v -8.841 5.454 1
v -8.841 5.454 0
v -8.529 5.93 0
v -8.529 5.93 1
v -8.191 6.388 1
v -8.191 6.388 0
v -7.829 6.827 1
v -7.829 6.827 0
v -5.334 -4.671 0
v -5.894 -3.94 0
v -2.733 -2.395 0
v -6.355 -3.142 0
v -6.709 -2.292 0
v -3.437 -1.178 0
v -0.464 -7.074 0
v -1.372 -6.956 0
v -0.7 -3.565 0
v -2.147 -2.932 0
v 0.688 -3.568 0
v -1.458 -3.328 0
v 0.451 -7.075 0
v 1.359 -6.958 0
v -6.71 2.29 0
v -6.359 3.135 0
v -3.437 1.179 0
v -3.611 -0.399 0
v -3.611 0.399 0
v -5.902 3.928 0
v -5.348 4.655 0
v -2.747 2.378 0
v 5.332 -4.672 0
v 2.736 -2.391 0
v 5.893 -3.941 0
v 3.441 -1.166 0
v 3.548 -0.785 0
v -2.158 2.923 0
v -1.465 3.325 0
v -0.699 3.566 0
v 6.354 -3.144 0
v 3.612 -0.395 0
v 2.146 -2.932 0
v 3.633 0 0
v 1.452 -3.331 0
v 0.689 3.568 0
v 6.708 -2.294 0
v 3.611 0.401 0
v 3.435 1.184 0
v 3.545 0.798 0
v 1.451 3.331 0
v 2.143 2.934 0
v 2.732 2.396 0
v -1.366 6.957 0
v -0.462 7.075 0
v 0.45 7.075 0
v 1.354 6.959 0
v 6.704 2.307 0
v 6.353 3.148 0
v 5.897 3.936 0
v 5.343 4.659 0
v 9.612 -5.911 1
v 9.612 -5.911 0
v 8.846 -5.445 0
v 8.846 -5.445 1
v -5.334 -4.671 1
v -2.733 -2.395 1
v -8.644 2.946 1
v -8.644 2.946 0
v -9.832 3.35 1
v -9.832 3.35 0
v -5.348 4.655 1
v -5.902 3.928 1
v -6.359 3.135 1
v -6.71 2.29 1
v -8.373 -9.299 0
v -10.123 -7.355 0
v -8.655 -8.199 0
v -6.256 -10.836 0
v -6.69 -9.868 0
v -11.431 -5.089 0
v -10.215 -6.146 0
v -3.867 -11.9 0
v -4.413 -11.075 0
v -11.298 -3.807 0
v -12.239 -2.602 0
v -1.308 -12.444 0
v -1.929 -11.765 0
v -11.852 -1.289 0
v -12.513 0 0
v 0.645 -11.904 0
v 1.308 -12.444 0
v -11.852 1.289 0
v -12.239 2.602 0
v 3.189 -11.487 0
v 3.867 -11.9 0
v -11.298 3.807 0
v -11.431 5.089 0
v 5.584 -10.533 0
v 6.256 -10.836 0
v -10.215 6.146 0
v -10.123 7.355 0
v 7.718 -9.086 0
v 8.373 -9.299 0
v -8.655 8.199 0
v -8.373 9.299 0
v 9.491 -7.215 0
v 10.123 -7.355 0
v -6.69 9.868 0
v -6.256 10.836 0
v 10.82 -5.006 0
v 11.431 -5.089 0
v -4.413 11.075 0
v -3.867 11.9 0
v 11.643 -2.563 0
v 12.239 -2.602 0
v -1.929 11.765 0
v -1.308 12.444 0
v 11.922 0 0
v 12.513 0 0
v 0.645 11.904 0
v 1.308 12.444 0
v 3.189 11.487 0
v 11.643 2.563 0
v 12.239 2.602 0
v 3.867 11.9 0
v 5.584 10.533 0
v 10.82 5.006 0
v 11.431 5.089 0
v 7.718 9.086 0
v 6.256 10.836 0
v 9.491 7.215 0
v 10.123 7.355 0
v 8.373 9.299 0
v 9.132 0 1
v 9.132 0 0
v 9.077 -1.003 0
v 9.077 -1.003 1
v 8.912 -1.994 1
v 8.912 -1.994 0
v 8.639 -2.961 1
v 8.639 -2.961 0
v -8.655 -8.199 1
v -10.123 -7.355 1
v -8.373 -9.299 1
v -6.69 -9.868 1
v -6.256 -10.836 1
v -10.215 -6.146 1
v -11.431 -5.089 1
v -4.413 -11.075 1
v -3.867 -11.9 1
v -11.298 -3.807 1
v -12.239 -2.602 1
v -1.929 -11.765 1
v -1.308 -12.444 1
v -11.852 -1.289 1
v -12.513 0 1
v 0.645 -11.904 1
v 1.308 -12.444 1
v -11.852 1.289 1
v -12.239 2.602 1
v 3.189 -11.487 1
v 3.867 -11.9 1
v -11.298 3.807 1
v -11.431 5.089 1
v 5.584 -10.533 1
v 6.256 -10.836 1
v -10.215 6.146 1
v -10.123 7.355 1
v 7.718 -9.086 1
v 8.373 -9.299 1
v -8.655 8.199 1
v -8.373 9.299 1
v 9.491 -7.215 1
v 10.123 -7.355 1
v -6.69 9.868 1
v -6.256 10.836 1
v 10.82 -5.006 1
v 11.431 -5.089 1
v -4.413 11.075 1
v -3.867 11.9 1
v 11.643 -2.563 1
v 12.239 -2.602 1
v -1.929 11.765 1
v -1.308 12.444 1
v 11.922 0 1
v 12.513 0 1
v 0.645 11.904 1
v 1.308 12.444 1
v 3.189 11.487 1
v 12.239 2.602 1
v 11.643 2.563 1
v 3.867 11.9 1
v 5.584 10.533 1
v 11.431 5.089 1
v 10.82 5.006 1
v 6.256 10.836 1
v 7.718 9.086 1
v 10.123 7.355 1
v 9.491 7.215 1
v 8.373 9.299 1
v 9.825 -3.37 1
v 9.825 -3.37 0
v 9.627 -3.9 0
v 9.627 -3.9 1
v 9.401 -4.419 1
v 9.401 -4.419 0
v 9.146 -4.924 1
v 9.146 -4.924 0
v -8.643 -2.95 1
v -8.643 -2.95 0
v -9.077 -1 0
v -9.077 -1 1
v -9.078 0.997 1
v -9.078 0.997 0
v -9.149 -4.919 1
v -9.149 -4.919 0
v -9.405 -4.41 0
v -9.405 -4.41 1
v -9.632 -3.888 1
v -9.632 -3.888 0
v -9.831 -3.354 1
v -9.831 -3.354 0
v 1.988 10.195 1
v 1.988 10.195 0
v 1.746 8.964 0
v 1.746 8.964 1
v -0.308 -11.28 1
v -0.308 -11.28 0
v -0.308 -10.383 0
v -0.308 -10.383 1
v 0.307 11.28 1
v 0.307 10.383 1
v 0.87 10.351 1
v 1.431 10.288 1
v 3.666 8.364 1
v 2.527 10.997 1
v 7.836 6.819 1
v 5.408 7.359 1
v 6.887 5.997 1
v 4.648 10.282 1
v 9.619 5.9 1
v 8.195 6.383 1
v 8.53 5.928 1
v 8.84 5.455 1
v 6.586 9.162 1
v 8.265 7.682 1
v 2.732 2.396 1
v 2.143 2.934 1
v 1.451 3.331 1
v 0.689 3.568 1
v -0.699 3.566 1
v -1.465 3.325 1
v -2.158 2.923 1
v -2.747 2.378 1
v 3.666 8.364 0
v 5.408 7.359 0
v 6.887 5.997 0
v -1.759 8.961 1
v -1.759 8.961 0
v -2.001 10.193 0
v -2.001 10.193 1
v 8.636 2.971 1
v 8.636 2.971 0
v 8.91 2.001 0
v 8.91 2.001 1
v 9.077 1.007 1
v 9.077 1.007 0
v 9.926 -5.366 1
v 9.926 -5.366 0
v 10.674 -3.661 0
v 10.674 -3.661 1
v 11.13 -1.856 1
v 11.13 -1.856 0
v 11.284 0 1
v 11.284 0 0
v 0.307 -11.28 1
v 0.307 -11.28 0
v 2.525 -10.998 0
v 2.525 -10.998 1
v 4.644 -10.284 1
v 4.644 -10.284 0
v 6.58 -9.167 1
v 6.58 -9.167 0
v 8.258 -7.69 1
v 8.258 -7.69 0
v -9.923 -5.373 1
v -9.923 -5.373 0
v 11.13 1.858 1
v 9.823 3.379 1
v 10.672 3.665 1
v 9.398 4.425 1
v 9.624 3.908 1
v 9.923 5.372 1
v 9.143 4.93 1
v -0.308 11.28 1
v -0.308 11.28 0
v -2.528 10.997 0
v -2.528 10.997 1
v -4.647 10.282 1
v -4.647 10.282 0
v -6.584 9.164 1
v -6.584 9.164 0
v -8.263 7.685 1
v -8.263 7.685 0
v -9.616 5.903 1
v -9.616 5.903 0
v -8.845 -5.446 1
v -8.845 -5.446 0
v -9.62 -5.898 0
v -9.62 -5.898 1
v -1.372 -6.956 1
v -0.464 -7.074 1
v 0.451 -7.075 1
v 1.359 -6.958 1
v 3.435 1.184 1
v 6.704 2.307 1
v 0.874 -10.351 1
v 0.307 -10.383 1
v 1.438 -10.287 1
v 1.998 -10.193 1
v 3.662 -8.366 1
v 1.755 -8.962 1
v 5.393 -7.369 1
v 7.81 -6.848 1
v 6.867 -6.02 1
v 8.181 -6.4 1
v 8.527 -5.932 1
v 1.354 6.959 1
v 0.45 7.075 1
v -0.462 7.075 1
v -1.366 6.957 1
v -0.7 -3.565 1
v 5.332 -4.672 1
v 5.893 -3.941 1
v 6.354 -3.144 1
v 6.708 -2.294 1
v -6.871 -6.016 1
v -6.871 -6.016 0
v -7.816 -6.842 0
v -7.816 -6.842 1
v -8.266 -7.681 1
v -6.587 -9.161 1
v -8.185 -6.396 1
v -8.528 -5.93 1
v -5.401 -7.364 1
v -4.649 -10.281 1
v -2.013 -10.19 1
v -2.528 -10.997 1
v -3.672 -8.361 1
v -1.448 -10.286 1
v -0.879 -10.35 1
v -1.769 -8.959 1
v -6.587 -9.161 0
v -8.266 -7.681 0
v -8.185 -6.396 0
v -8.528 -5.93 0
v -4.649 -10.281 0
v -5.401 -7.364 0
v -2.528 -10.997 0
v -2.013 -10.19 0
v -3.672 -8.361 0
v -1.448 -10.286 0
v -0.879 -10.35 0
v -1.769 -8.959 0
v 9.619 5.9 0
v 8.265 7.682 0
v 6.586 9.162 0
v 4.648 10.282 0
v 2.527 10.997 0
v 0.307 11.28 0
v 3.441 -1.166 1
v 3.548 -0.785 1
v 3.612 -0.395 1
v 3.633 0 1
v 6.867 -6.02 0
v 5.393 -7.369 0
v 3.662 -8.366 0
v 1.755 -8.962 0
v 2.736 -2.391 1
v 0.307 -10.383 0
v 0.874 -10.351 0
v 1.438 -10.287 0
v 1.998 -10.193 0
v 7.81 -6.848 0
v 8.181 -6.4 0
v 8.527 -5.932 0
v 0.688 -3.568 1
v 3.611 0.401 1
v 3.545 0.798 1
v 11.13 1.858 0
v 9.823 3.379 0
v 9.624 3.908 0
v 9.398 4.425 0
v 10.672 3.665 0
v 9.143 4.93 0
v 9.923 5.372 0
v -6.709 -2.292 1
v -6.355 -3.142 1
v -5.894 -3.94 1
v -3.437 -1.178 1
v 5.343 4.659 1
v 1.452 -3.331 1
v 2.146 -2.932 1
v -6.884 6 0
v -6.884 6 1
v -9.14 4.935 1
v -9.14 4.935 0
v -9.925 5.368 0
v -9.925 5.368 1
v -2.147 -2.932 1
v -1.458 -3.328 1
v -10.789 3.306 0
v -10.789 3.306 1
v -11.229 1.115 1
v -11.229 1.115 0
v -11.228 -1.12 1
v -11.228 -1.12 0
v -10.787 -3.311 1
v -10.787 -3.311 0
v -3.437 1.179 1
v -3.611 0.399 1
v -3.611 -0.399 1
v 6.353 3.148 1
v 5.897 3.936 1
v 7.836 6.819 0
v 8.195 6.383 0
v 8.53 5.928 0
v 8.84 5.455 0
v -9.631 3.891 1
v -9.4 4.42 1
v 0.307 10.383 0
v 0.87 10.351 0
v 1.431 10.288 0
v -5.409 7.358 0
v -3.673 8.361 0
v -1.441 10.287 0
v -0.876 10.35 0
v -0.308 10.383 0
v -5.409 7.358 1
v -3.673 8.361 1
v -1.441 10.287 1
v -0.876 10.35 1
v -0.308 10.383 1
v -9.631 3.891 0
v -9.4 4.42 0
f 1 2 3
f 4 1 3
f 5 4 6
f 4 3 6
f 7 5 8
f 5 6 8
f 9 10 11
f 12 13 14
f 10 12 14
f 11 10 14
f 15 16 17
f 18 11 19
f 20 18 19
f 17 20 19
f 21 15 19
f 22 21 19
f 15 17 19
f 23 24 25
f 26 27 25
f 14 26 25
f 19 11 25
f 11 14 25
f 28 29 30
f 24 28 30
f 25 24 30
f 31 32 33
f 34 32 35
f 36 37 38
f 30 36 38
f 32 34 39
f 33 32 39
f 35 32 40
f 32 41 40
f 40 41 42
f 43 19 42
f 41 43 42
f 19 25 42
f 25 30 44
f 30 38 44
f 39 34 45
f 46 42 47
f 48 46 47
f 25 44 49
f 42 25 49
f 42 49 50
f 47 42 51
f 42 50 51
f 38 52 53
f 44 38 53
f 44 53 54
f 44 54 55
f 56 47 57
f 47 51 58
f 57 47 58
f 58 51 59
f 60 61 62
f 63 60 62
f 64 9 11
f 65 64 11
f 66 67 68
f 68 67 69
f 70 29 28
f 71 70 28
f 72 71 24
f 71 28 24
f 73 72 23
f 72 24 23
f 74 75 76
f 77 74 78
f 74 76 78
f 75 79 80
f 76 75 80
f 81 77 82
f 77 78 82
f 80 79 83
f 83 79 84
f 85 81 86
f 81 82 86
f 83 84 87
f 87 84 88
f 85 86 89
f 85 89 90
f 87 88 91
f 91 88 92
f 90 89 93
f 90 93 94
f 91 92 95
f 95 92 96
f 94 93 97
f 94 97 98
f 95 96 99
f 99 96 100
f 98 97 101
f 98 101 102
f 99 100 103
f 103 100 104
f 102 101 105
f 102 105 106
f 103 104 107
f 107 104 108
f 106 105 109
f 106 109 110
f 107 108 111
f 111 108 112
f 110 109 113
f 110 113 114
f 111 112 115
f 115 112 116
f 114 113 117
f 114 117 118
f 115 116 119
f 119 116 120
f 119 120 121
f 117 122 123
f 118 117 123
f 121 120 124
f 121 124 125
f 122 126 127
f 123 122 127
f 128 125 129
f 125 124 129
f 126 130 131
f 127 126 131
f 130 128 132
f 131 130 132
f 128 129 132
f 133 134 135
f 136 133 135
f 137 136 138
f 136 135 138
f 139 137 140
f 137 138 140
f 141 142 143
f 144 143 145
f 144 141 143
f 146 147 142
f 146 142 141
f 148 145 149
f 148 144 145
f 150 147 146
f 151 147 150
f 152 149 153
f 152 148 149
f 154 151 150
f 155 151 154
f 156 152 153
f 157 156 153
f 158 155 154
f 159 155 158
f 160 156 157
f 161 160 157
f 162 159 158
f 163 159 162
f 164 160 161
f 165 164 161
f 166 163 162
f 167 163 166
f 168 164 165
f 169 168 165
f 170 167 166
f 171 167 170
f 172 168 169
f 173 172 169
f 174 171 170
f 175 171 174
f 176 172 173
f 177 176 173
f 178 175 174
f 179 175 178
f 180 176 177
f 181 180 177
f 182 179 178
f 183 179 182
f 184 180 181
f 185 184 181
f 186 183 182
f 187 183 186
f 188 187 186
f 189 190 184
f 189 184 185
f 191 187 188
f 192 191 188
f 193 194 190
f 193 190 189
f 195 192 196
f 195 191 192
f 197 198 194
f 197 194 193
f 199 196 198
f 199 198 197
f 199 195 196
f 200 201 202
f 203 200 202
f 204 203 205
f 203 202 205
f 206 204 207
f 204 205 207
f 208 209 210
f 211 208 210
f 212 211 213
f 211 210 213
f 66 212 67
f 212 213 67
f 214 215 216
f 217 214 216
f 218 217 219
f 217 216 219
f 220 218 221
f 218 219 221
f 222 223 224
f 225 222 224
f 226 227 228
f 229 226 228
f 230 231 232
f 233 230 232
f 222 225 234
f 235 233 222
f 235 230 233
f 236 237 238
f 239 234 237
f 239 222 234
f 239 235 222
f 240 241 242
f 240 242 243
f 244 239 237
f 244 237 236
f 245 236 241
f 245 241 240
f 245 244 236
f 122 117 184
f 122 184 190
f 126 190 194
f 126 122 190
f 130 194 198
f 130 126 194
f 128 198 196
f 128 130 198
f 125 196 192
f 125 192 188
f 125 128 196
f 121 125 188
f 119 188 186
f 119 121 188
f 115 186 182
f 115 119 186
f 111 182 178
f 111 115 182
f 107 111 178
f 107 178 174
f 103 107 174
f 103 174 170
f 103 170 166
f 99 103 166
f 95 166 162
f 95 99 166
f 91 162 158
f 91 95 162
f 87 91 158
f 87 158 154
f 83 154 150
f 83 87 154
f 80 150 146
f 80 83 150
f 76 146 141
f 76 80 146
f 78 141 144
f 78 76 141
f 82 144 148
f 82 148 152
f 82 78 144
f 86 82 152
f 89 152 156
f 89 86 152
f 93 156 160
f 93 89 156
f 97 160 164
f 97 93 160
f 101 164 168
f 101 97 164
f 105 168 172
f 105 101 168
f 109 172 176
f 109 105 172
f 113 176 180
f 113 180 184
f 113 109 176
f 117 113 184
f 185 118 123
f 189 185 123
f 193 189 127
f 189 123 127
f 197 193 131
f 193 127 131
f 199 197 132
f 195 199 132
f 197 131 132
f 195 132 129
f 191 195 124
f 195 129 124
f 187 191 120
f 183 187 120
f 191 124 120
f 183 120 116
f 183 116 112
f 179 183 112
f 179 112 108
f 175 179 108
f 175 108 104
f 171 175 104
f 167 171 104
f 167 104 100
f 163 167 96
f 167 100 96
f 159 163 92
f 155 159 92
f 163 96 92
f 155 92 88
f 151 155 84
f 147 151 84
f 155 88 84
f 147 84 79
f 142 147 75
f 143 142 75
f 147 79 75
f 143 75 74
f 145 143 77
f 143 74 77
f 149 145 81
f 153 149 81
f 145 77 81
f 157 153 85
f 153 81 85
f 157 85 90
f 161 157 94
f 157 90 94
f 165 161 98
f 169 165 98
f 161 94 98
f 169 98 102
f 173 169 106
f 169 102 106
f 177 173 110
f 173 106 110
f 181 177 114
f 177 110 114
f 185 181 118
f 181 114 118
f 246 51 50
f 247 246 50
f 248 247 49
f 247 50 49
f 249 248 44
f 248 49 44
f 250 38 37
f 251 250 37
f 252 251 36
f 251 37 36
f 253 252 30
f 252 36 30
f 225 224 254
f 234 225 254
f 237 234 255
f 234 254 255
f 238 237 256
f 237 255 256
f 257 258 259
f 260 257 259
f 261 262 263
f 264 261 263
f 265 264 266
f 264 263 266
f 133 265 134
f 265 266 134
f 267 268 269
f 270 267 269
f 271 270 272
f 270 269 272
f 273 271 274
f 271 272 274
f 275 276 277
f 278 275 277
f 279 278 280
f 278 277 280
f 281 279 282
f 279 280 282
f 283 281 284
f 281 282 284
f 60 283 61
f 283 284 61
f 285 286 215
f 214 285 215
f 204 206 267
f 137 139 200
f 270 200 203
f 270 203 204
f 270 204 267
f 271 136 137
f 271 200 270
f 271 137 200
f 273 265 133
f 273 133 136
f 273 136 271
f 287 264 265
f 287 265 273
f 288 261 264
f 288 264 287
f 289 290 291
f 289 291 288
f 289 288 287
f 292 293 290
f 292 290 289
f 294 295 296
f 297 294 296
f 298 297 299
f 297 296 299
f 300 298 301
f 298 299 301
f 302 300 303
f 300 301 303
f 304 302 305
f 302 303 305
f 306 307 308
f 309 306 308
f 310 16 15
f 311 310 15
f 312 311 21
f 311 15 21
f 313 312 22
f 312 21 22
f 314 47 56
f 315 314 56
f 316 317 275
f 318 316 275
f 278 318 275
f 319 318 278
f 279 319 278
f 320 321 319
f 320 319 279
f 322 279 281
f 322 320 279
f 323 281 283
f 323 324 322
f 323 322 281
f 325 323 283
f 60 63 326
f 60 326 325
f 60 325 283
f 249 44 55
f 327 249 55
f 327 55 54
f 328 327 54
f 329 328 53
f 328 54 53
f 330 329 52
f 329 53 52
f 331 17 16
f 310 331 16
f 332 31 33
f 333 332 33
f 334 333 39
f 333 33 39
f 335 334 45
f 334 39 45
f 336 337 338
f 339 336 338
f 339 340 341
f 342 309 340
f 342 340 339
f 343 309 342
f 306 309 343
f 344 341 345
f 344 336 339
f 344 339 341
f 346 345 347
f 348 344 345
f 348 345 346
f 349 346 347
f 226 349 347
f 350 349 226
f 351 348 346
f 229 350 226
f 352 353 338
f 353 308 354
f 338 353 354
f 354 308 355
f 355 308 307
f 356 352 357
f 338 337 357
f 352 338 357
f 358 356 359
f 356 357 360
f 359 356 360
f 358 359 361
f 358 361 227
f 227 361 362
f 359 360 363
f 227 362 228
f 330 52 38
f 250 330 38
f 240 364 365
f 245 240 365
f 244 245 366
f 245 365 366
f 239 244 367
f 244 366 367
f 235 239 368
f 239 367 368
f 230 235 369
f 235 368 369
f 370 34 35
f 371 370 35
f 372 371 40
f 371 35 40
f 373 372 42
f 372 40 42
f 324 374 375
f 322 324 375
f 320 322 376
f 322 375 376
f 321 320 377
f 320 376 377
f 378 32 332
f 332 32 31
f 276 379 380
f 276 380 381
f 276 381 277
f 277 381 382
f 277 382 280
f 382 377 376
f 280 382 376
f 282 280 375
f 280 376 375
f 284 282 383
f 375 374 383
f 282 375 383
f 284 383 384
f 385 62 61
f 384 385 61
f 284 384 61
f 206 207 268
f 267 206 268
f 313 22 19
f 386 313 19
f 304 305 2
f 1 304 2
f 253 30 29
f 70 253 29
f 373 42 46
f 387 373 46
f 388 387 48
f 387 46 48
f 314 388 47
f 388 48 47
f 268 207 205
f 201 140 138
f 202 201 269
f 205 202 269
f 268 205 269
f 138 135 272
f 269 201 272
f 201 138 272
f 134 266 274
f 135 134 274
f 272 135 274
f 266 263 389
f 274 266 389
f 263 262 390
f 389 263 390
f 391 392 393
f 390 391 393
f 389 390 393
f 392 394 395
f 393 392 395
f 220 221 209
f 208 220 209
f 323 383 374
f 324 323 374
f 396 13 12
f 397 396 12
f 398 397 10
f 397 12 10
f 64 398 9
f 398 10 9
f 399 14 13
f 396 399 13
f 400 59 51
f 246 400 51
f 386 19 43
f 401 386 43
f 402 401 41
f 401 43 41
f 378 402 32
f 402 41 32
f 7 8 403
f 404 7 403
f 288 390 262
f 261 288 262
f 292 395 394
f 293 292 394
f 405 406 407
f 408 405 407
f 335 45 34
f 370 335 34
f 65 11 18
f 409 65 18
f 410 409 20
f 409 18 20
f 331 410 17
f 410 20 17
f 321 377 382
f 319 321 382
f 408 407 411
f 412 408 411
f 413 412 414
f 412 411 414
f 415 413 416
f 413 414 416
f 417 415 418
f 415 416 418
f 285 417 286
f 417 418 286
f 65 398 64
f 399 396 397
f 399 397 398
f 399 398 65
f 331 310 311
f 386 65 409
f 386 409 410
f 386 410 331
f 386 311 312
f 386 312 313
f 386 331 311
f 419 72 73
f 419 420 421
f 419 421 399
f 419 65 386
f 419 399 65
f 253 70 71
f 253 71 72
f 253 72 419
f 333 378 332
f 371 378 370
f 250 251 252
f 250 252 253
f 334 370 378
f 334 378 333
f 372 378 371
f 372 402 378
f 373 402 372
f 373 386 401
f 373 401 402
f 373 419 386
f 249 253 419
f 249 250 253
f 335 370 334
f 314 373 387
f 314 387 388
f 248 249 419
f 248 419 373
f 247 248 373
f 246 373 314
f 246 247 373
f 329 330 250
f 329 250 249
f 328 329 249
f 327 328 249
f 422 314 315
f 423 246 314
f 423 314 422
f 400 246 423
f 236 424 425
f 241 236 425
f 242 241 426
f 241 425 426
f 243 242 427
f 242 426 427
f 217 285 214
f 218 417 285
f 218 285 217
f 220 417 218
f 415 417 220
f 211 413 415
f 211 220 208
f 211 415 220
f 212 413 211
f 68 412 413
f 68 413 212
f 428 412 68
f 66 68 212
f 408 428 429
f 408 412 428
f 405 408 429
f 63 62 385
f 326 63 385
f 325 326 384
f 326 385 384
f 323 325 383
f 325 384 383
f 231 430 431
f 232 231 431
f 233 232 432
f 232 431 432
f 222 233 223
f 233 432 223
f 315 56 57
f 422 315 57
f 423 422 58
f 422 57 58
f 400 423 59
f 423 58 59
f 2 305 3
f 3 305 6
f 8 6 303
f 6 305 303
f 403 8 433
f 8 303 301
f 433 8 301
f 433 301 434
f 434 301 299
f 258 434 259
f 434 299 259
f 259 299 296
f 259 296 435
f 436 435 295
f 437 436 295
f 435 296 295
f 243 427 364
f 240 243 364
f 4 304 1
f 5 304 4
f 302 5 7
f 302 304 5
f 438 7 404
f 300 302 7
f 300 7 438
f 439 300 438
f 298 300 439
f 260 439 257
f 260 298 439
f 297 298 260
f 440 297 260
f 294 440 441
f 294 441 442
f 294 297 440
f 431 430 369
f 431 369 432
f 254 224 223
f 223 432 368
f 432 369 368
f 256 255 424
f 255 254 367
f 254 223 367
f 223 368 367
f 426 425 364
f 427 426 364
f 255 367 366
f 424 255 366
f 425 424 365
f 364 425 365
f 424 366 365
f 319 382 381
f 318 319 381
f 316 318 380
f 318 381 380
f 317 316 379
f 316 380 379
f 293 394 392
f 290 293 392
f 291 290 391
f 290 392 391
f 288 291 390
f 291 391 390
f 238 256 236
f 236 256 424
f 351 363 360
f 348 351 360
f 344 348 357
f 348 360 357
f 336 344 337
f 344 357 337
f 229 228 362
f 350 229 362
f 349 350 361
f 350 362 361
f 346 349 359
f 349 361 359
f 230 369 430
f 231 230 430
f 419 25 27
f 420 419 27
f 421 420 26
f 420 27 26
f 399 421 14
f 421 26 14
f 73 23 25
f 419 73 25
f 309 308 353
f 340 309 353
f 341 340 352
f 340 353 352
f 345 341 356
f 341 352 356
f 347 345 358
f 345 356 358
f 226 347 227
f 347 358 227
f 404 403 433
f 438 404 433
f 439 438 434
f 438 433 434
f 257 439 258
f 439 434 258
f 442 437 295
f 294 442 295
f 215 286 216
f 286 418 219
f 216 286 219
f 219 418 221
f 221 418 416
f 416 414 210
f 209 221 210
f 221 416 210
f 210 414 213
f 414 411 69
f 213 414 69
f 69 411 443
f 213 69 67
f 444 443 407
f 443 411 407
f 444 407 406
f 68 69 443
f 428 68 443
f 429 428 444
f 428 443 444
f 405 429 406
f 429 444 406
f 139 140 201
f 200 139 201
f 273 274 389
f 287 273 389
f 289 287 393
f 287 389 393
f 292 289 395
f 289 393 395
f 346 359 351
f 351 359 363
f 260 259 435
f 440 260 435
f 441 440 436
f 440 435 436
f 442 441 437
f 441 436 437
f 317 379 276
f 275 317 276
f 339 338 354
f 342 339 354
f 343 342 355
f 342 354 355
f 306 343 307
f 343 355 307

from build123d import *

# Parameters (mm, degrees)
F0_R     = 12.5129035434
F0_R_2   = 11.9218678141
F1_DEPTH = 1


with BuildPart() as f1:
    # F0 (on Top) → F1 (new body)
    with BuildSketch(Plane.XY):
        Circle(F0_R)
        Circle(F0_R_2, mode=Mode.SUBTRACT)
    extrude(amount=F1_DEPTH)


with BuildPart() as f1b:
    # F0 (on Top) → F1, piece 2 (new body)
    with BuildSketch(Plane.XY):
        with BuildLine():
            Line((8.8396388075, 5.4551908651), (9.6186460471, 5.8997504842))
            ThreePointArc((9.6186460471, 5.8997504842), (5.6447897831, 9.7704532065), (0.3066178794, 11.2796894031))
            Line((0.3066178794, 11.2796894031), (0.3066178794, 10.3828852974))
            ThreePointArc((0.3066178794, 10.3828852974), (1.1509963885, 10.3234455942), (1.9877316065, 10.1954521569))
            ThreePointArc((1.9877316065, 10.1954521569), (5.1936189617, 8.9958125649), (7.8355230443, 6.8193035014))
            ThreePointArc((7.8355230443, 6.8193035014), (8.3654322373, 6.1577483795), (8.8396388075, 5.4551908651))
        make_face()
        with BuildLine():
            Line((6.8870497225, 5.9972767185), (7.8355230443, 6.8193035014))
            ThreePointArc((7.8355230443, 6.8193035014), (5.1936189617, 8.9958125649), (1.9877316065, 10.1954521569))
            Line((1.9877316065, 10.1954521569), (1.7464057225, 8.9637519471))
            ThreePointArc((1.7464057225, 8.9637519471), (4.5644421401, 7.9097819102), (6.8870497225, 5.9972767185))
        make_face()
    extrude(amount=F1_DEPTH)


with BuildPart() as f1c:
    # F0 (on Top) → F1, piece 3 (new body)
    with BuildSketch(Plane.XY):
        with BuildLine():
            ThreePointArc((9.9261432267, -5.3662918481), (10.9391631066, -2.7676918331), (11.2838560588, 0))
            ThreePointArc((11.2838560588, 0), (10.9383436287, 2.7709287641), (9.9229655661, 5.3721654786))
            Line((9.9229655661, 5.3721654786), (9.1430323592, 4.9298357885))
            ThreePointArc((9.1430323592, 4.9298357885), (9.5144902121, 4.1680688127), (9.8226109206, 3.3785553607))
            ThreePointArc((9.8226109206, 3.3785553607), (10.2452385313, 1.7127197841), (10.3874116902, 0))
            ThreePointArc((10.3874116902, 0), (10.2459681219, -1.70834975), (9.8254894414, -3.3701749005))
            ThreePointArc((9.8254894414, -3.3701749005), (9.5176290977, -4.1608962954), (9.1462564846, -4.9238515351))
            Line((9.1462564846, -4.9238515351), (9.9261432267, -5.3662918481))
        make_face()
        with BuildLine():
            ThreePointArc((10.3874116902, 0), (10.2452385313, 1.7127197841), (9.8226109206, 3.3785553607))
            Line((9.8226109206, 3.3785553607), (8.6355698302, 2.9708106006))
            ThreePointArc((8.6355698302, 2.9708106006), (9.0072564883, 1.5060253886), (9.1322933548, 0))
            ThreePointArc((9.1322933548, 0), (9.0081483571, -1.5006815429), (8.6390886349, -2.9605623582))
            Line((8.6390886349, -2.9605623582), (9.8254894414, -3.3701749005))
            ThreePointArc((9.8254894414, -3.3701749005), (10.2459681219, -1.70834975), (10.3874116902, 0))
        make_face()
    extrude(amount=F1_DEPTH)


with BuildPart() as f1d:
    # F0 (on Top) → F1, piece 4 (new body)
    with BuildSketch(Plane.XY):
        with BuildLine():
            ThreePointArc((0.3073497054, -11.279669486), (5.6395470454, -9.7734802746), (9.6119265196, -5.9106916801))
            Line((9.6119265196, -5.9106916801), (8.8460164405, -5.4448429506))
            ThreePointArc((8.8460164405, -5.4448429506), (8.3575809895, -6.1684002486), (7.8101145103, -6.8483890776))
            ThreePointArc((7.8101145103, -6.8483890776), (5.1814766366, -9.0028118656), (1.9981252265, -10.1934202897))
            ThreePointArc((1.9981252265, -10.1934202897), (1.1566226105, -10.3228167551), (0.3073497054, -10.38286366))
            Line((0.3073497054, -10.38286366), (0.3073497054, -11.279669486))
        make_face()
        with BuildLine():
            ThreePointArc((1.9981252265, -10.1934202897), (5.1814766366, -9.0028118656), (7.8101145103, -6.8483890776))
            Line((7.8101145103, -6.8483890776), (6.867075268, -6.0201378042))
            ThreePointArc((6.867075268, -6.0201378042), (4.5549562659, -7.91524828), (1.7547104258, -8.9621299499))
            Line((1.7547104258, -8.9621299499), (1.9981252265, -10.1934202897))
        make_face()
    extrude(amount=F1_DEPTH)


with BuildPart() as f1e:
    # F0 (on Top) → F1, piece 5 (new body)
    with BuildSketch(Plane.XY):
        with BuildLine():
            ThreePointArc((-9.6198182765, -5.8978389164), (-5.6462804441, -9.7695918391), (-0.3078183345, -11.279656707))
            Line((-0.3078183345, -11.279656707), (-0.3078183345, -10.3828497772))
            ThreePointArc((-0.3078183345, -10.3828497772), (-1.1643749142, -10.3219451985), (-2.0129739246, -10.1904983981))
            ThreePointArc((-2.0129739246, -10.1904983981), (-5.1916924434, -8.996924541), (-7.8156817855, -6.8420347742))
            ThreePointArc((-7.8156817855, -6.8420347742), (-8.3597920993, -6.165403286), (-8.8454924969, -5.4456940889))
            Line((-8.8454924969, -5.4456940889), (-9.6198182765, -5.8978389164))
        make_face()
        with BuildLine():
            ThreePointArc((-7.8156817855, -6.8420347742), (-5.1916924434, -8.996924541), (-2.0129739246, -10.1904983981))
            Line((-2.0129739246, -10.1904983981), (-1.7689643242, -8.959327382))
            ThreePointArc((-1.7689643242, -8.959327382), (-4.5638648899, -7.9101149919), (-6.8710532338, -6.0155971753))
            Line((-6.8710532338, -6.0155971753), (-7.8156817855, -6.8420347742))
        make_face()
    extrude(amount=F1_DEPTH)


with BuildPart() as f1f:
    # F0 (on Top) → F1, piece 6 (new body)
    with BuildSketch(Plane.XY):
        with BuildLine():
            Line((-9.1400735771, 4.9353193035), (-9.9254042713, 5.3676584846))
            ThreePointArc((-9.9254042713, 5.3676584846), (-11.2838557205, -0.0027629713), (-9.9227744254, -5.3725185209))
            Line((-9.9227744254, -5.3725185209), (-9.1490233494, -4.9187085069))
            ThreePointArc((-9.1490233494, -4.9187085069), (-9.5222238475, -4.1503704197), (-9.8310338698, -3.3539670055))
            ThreePointArc((-9.8310338698, -3.3539670055), (-10.3874114756, -0.002111833), (-9.8323968267, 3.3499692932))
            ThreePointArc((-9.8323968267, 3.3499692932), (-9.5192957706, 4.1570818675), (-9.1400735771, 4.9353193035))
        make_face()
        with BuildLine():
            Line((-8.6439002318, 2.9464844647), (-9.8323968267, 3.3499692932))
            ThreePointArc((-9.8323968267, 3.3499692932), (-10.3874114756, -0.002111833), (-9.8310338698, -3.3539670055))
            Line((-9.8310338698, -3.3539670055), (-8.6428088374, -2.9496842744))
            ThreePointArc((-8.6428088374, -2.9496842744), (-9.1322931983, -0.0016904085), (-8.6439002318, 2.9464844647))
        make_face()
    extrude(amount=F1_DEPTH)


with BuildPart() as f1g:
    # F0 (on Top) → F1, piece 7 (new body)
    with BuildSketch(Plane.XY):
        with BuildLine():
            Line((-0.3083923438, 10.3828327438), (-0.3083923438, 11.2796410279))
            ThreePointArc((-0.3083923438, 11.2796410279), (-5.643671845, 9.7710989997), (-9.6163671511, 5.9034642687))
            Line((-9.6163671511, 5.9034642687), (-8.8405045503, 5.4537877589))
            ThreePointArc((-8.8405045503, 5.4537877589), (-8.3629197756, 6.1611601544), (-7.8288737244, 6.8269361965))
            ThreePointArc((-7.8288737244, 6.8269361965), (-5.1952200664, 8.9948879973), (-2.0012950213, 10.1927984313))
            ThreePointArc((-2.0012950213, 10.1927984313), (-1.1587459562, 10.3225786232), (-0.3083923438, 10.3828327438))
        make_face()
        with BuildLine():
            Line((-1.7593740184, 8.9612155973), (-2.0012950213, 10.1927984313))
            ThreePointArc((-2.0012950213, 10.1927984313), (-5.1952200664, 8.9948879973), (-7.8288737244, 6.8269361965))
            Line((-7.8288737244, 6.8269361965), (-6.8844707632, 6.0002370143))
            ThreePointArc((-6.8844707632, 6.0002370143), (-4.5684638222, 7.9074597832), (-1.7593740184, 8.9612155973))
        make_face()
    extrude(amount=F1_DEPTH)


with BuildPart() as f1h:
    # F0 (on Top) → F1, piece 8 (new body)
    with BuildSketch(Plane.XY):
        with BuildLine():
            ThreePointArc((3.6334755842, 0), (3.583514543, 0.6004734312), (3.4350053685, 1.1844335945))
            ThreePointArc((3.4350053685, 1.1844335945), (3.1422657187, 1.8243659102), (2.7316602961, 2.3958666173))
            ThreePointArc((2.7316602961, 2.3958666173), (1.8079395778, 3.1517454377), (0.6891283027, 3.5675267348))
            ThreePointArc((0.6891283027, 3.5675267348), (-0.0052782479, 3.6334717504), (-0.6994902751, 3.5655095255))
            ThreePointArc((-0.6994902751, 3.5655095255), (-1.822570271, 3.1433075619), (-2.7469170245, 2.3783590313))
            ThreePointArc((-2.7469170245, 2.3783590313), (-3.1495741996, 1.8117193995), (-3.4369534347, 1.1787688105))
            ThreePointArc((-3.4369534347, 1.1787688105), (-3.6334755809, 0.0001559043), (-3.4370545787, -1.1784738623))
            ThreePointArc((-3.4370545787, -1.1784738623), (-3.1441760167, -1.8210716617), (-2.7325265002, -2.3948786497))
            ThreePointArc((-2.7325265002, -2.3948786497), (-1.8132795313, -3.1486762556), (-0.699929749, -3.5654232803))
            ThreePointArc((-0.699929749, -3.5654232803), (-0.0059345256, -3.6334707378), (0.6882792775, -3.5676906336))
            ThreePointArc((0.6882792775, -3.5676906336), (1.8100979826, -3.1505063267), (2.7355090954, -2.3914712648))
            ThreePointArc((2.7355090954, -2.3914712648), (3.1486052863, -1.8134027606), (3.4413079596, -1.1659950037))
            ThreePointArc((3.4413079596, -1.1659950037), (3.5851118023, -0.5908622396), (3.6334755842, 0))
        make_face()
        with BuildLine():
            Line((0.6891283027, 3.5675267348), (1.3536648238, 6.9592465073))
            ThreePointArc((1.3536648238, 6.9592465073), (-0.0061134144, 7.0896743952), (-1.3656646951, 6.956901634))
            Line((-1.3656646951, 6.956901634), (-0.6994902751, 3.5655095255))
            ThreePointArc((-0.6994902751, 3.5655095255), (-0.0052782479, 3.6334717504), (0.6891283027, 3.5675267348))
        make_face()
        with BuildLine():
            Line((-2.7469170245, 2.3783590313), (-5.3475202715, 4.6548412809))
            ThreePointArc((-5.3475202715, 4.6548412809), (-6.1434908203, 3.5385082939), (-6.7097054717, 2.2898412362))
            Line((-6.7097054717, 2.2898412362), (-3.4369534347, 1.1787688105))
            ThreePointArc((-3.4369534347, 1.1787688105), (-3.1495741996, 1.8117193995), (-2.7469170245, 2.3783590313))
        make_face()
        with BuildLine():
            ThreePointArc((-6.7090562856, -2.2917426037), (-6.1377513921, -3.5484543471), (-5.3337370357, -4.6706283986))
            Line((-5.3337370357, -4.6706283986), (-2.7325265002, -2.3948786497))
            ThreePointArc((-2.7325265002, -2.3948786497), (-3.1441760167, -1.8210716617), (-3.4370545787, -1.1784738623))
            Line((-3.4370545787, -1.1784738623), (-6.7090562856, -2.2917426037))
        make_face()
        with BuildLine():
            ThreePointArc((-1.3718559148, -6.9556834138), (-0.0067697658, -7.0896737989), (1.3585697823, -6.9582906343))
            Line((1.3585697823, -6.9582906343), (0.6882792775, -3.5676906336))
            ThreePointArc((0.6882792775, -3.5676906336), (-0.0059345256, -3.6334707378), (-0.699929749, -3.5654232803))
            Line((-0.699929749, -3.5654232803), (-1.3718559148, -6.9556834138))
        make_face()
        with BuildLine():
            ThreePointArc((5.3323453366, -4.6722172055), (6.1366397383, -3.5503764767), (6.7083031564, -2.2939461994))
            Line((6.7083031564, -2.2939461994), (3.4413079596, -1.1659950037))
            ThreePointArc((3.4413079596, -1.1659950037), (3.1486052863, -1.8134027606), (2.7355090954, -2.3914712648))
            Line((2.7355090954, -2.3914712648), (5.3323453366, -4.6722172055))
        make_face()
        with BuildLine():
            Line((3.4350053685, 1.1844335945), (6.7037443217, 2.3072348112))
            ThreePointArc((6.7037443217, 2.3072348112), (6.1373562448, 3.5491377444), (5.3434747305, 4.6594847579))
            Line((5.3434747305, 4.6594847579), (2.7316602961, 2.3958666173))
            ThreePointArc((2.7316602961, 2.3958666173), (3.1422657187, 1.8243659102), (3.4350053685, 1.1844335945))
        make_face()
    extrude(amount=F1_DEPTH)


solid = Compound([f1.part, f1b.part, f1c.part, f1d.part, f1e.part, f1f.part, f1g.part, f1h.part])
